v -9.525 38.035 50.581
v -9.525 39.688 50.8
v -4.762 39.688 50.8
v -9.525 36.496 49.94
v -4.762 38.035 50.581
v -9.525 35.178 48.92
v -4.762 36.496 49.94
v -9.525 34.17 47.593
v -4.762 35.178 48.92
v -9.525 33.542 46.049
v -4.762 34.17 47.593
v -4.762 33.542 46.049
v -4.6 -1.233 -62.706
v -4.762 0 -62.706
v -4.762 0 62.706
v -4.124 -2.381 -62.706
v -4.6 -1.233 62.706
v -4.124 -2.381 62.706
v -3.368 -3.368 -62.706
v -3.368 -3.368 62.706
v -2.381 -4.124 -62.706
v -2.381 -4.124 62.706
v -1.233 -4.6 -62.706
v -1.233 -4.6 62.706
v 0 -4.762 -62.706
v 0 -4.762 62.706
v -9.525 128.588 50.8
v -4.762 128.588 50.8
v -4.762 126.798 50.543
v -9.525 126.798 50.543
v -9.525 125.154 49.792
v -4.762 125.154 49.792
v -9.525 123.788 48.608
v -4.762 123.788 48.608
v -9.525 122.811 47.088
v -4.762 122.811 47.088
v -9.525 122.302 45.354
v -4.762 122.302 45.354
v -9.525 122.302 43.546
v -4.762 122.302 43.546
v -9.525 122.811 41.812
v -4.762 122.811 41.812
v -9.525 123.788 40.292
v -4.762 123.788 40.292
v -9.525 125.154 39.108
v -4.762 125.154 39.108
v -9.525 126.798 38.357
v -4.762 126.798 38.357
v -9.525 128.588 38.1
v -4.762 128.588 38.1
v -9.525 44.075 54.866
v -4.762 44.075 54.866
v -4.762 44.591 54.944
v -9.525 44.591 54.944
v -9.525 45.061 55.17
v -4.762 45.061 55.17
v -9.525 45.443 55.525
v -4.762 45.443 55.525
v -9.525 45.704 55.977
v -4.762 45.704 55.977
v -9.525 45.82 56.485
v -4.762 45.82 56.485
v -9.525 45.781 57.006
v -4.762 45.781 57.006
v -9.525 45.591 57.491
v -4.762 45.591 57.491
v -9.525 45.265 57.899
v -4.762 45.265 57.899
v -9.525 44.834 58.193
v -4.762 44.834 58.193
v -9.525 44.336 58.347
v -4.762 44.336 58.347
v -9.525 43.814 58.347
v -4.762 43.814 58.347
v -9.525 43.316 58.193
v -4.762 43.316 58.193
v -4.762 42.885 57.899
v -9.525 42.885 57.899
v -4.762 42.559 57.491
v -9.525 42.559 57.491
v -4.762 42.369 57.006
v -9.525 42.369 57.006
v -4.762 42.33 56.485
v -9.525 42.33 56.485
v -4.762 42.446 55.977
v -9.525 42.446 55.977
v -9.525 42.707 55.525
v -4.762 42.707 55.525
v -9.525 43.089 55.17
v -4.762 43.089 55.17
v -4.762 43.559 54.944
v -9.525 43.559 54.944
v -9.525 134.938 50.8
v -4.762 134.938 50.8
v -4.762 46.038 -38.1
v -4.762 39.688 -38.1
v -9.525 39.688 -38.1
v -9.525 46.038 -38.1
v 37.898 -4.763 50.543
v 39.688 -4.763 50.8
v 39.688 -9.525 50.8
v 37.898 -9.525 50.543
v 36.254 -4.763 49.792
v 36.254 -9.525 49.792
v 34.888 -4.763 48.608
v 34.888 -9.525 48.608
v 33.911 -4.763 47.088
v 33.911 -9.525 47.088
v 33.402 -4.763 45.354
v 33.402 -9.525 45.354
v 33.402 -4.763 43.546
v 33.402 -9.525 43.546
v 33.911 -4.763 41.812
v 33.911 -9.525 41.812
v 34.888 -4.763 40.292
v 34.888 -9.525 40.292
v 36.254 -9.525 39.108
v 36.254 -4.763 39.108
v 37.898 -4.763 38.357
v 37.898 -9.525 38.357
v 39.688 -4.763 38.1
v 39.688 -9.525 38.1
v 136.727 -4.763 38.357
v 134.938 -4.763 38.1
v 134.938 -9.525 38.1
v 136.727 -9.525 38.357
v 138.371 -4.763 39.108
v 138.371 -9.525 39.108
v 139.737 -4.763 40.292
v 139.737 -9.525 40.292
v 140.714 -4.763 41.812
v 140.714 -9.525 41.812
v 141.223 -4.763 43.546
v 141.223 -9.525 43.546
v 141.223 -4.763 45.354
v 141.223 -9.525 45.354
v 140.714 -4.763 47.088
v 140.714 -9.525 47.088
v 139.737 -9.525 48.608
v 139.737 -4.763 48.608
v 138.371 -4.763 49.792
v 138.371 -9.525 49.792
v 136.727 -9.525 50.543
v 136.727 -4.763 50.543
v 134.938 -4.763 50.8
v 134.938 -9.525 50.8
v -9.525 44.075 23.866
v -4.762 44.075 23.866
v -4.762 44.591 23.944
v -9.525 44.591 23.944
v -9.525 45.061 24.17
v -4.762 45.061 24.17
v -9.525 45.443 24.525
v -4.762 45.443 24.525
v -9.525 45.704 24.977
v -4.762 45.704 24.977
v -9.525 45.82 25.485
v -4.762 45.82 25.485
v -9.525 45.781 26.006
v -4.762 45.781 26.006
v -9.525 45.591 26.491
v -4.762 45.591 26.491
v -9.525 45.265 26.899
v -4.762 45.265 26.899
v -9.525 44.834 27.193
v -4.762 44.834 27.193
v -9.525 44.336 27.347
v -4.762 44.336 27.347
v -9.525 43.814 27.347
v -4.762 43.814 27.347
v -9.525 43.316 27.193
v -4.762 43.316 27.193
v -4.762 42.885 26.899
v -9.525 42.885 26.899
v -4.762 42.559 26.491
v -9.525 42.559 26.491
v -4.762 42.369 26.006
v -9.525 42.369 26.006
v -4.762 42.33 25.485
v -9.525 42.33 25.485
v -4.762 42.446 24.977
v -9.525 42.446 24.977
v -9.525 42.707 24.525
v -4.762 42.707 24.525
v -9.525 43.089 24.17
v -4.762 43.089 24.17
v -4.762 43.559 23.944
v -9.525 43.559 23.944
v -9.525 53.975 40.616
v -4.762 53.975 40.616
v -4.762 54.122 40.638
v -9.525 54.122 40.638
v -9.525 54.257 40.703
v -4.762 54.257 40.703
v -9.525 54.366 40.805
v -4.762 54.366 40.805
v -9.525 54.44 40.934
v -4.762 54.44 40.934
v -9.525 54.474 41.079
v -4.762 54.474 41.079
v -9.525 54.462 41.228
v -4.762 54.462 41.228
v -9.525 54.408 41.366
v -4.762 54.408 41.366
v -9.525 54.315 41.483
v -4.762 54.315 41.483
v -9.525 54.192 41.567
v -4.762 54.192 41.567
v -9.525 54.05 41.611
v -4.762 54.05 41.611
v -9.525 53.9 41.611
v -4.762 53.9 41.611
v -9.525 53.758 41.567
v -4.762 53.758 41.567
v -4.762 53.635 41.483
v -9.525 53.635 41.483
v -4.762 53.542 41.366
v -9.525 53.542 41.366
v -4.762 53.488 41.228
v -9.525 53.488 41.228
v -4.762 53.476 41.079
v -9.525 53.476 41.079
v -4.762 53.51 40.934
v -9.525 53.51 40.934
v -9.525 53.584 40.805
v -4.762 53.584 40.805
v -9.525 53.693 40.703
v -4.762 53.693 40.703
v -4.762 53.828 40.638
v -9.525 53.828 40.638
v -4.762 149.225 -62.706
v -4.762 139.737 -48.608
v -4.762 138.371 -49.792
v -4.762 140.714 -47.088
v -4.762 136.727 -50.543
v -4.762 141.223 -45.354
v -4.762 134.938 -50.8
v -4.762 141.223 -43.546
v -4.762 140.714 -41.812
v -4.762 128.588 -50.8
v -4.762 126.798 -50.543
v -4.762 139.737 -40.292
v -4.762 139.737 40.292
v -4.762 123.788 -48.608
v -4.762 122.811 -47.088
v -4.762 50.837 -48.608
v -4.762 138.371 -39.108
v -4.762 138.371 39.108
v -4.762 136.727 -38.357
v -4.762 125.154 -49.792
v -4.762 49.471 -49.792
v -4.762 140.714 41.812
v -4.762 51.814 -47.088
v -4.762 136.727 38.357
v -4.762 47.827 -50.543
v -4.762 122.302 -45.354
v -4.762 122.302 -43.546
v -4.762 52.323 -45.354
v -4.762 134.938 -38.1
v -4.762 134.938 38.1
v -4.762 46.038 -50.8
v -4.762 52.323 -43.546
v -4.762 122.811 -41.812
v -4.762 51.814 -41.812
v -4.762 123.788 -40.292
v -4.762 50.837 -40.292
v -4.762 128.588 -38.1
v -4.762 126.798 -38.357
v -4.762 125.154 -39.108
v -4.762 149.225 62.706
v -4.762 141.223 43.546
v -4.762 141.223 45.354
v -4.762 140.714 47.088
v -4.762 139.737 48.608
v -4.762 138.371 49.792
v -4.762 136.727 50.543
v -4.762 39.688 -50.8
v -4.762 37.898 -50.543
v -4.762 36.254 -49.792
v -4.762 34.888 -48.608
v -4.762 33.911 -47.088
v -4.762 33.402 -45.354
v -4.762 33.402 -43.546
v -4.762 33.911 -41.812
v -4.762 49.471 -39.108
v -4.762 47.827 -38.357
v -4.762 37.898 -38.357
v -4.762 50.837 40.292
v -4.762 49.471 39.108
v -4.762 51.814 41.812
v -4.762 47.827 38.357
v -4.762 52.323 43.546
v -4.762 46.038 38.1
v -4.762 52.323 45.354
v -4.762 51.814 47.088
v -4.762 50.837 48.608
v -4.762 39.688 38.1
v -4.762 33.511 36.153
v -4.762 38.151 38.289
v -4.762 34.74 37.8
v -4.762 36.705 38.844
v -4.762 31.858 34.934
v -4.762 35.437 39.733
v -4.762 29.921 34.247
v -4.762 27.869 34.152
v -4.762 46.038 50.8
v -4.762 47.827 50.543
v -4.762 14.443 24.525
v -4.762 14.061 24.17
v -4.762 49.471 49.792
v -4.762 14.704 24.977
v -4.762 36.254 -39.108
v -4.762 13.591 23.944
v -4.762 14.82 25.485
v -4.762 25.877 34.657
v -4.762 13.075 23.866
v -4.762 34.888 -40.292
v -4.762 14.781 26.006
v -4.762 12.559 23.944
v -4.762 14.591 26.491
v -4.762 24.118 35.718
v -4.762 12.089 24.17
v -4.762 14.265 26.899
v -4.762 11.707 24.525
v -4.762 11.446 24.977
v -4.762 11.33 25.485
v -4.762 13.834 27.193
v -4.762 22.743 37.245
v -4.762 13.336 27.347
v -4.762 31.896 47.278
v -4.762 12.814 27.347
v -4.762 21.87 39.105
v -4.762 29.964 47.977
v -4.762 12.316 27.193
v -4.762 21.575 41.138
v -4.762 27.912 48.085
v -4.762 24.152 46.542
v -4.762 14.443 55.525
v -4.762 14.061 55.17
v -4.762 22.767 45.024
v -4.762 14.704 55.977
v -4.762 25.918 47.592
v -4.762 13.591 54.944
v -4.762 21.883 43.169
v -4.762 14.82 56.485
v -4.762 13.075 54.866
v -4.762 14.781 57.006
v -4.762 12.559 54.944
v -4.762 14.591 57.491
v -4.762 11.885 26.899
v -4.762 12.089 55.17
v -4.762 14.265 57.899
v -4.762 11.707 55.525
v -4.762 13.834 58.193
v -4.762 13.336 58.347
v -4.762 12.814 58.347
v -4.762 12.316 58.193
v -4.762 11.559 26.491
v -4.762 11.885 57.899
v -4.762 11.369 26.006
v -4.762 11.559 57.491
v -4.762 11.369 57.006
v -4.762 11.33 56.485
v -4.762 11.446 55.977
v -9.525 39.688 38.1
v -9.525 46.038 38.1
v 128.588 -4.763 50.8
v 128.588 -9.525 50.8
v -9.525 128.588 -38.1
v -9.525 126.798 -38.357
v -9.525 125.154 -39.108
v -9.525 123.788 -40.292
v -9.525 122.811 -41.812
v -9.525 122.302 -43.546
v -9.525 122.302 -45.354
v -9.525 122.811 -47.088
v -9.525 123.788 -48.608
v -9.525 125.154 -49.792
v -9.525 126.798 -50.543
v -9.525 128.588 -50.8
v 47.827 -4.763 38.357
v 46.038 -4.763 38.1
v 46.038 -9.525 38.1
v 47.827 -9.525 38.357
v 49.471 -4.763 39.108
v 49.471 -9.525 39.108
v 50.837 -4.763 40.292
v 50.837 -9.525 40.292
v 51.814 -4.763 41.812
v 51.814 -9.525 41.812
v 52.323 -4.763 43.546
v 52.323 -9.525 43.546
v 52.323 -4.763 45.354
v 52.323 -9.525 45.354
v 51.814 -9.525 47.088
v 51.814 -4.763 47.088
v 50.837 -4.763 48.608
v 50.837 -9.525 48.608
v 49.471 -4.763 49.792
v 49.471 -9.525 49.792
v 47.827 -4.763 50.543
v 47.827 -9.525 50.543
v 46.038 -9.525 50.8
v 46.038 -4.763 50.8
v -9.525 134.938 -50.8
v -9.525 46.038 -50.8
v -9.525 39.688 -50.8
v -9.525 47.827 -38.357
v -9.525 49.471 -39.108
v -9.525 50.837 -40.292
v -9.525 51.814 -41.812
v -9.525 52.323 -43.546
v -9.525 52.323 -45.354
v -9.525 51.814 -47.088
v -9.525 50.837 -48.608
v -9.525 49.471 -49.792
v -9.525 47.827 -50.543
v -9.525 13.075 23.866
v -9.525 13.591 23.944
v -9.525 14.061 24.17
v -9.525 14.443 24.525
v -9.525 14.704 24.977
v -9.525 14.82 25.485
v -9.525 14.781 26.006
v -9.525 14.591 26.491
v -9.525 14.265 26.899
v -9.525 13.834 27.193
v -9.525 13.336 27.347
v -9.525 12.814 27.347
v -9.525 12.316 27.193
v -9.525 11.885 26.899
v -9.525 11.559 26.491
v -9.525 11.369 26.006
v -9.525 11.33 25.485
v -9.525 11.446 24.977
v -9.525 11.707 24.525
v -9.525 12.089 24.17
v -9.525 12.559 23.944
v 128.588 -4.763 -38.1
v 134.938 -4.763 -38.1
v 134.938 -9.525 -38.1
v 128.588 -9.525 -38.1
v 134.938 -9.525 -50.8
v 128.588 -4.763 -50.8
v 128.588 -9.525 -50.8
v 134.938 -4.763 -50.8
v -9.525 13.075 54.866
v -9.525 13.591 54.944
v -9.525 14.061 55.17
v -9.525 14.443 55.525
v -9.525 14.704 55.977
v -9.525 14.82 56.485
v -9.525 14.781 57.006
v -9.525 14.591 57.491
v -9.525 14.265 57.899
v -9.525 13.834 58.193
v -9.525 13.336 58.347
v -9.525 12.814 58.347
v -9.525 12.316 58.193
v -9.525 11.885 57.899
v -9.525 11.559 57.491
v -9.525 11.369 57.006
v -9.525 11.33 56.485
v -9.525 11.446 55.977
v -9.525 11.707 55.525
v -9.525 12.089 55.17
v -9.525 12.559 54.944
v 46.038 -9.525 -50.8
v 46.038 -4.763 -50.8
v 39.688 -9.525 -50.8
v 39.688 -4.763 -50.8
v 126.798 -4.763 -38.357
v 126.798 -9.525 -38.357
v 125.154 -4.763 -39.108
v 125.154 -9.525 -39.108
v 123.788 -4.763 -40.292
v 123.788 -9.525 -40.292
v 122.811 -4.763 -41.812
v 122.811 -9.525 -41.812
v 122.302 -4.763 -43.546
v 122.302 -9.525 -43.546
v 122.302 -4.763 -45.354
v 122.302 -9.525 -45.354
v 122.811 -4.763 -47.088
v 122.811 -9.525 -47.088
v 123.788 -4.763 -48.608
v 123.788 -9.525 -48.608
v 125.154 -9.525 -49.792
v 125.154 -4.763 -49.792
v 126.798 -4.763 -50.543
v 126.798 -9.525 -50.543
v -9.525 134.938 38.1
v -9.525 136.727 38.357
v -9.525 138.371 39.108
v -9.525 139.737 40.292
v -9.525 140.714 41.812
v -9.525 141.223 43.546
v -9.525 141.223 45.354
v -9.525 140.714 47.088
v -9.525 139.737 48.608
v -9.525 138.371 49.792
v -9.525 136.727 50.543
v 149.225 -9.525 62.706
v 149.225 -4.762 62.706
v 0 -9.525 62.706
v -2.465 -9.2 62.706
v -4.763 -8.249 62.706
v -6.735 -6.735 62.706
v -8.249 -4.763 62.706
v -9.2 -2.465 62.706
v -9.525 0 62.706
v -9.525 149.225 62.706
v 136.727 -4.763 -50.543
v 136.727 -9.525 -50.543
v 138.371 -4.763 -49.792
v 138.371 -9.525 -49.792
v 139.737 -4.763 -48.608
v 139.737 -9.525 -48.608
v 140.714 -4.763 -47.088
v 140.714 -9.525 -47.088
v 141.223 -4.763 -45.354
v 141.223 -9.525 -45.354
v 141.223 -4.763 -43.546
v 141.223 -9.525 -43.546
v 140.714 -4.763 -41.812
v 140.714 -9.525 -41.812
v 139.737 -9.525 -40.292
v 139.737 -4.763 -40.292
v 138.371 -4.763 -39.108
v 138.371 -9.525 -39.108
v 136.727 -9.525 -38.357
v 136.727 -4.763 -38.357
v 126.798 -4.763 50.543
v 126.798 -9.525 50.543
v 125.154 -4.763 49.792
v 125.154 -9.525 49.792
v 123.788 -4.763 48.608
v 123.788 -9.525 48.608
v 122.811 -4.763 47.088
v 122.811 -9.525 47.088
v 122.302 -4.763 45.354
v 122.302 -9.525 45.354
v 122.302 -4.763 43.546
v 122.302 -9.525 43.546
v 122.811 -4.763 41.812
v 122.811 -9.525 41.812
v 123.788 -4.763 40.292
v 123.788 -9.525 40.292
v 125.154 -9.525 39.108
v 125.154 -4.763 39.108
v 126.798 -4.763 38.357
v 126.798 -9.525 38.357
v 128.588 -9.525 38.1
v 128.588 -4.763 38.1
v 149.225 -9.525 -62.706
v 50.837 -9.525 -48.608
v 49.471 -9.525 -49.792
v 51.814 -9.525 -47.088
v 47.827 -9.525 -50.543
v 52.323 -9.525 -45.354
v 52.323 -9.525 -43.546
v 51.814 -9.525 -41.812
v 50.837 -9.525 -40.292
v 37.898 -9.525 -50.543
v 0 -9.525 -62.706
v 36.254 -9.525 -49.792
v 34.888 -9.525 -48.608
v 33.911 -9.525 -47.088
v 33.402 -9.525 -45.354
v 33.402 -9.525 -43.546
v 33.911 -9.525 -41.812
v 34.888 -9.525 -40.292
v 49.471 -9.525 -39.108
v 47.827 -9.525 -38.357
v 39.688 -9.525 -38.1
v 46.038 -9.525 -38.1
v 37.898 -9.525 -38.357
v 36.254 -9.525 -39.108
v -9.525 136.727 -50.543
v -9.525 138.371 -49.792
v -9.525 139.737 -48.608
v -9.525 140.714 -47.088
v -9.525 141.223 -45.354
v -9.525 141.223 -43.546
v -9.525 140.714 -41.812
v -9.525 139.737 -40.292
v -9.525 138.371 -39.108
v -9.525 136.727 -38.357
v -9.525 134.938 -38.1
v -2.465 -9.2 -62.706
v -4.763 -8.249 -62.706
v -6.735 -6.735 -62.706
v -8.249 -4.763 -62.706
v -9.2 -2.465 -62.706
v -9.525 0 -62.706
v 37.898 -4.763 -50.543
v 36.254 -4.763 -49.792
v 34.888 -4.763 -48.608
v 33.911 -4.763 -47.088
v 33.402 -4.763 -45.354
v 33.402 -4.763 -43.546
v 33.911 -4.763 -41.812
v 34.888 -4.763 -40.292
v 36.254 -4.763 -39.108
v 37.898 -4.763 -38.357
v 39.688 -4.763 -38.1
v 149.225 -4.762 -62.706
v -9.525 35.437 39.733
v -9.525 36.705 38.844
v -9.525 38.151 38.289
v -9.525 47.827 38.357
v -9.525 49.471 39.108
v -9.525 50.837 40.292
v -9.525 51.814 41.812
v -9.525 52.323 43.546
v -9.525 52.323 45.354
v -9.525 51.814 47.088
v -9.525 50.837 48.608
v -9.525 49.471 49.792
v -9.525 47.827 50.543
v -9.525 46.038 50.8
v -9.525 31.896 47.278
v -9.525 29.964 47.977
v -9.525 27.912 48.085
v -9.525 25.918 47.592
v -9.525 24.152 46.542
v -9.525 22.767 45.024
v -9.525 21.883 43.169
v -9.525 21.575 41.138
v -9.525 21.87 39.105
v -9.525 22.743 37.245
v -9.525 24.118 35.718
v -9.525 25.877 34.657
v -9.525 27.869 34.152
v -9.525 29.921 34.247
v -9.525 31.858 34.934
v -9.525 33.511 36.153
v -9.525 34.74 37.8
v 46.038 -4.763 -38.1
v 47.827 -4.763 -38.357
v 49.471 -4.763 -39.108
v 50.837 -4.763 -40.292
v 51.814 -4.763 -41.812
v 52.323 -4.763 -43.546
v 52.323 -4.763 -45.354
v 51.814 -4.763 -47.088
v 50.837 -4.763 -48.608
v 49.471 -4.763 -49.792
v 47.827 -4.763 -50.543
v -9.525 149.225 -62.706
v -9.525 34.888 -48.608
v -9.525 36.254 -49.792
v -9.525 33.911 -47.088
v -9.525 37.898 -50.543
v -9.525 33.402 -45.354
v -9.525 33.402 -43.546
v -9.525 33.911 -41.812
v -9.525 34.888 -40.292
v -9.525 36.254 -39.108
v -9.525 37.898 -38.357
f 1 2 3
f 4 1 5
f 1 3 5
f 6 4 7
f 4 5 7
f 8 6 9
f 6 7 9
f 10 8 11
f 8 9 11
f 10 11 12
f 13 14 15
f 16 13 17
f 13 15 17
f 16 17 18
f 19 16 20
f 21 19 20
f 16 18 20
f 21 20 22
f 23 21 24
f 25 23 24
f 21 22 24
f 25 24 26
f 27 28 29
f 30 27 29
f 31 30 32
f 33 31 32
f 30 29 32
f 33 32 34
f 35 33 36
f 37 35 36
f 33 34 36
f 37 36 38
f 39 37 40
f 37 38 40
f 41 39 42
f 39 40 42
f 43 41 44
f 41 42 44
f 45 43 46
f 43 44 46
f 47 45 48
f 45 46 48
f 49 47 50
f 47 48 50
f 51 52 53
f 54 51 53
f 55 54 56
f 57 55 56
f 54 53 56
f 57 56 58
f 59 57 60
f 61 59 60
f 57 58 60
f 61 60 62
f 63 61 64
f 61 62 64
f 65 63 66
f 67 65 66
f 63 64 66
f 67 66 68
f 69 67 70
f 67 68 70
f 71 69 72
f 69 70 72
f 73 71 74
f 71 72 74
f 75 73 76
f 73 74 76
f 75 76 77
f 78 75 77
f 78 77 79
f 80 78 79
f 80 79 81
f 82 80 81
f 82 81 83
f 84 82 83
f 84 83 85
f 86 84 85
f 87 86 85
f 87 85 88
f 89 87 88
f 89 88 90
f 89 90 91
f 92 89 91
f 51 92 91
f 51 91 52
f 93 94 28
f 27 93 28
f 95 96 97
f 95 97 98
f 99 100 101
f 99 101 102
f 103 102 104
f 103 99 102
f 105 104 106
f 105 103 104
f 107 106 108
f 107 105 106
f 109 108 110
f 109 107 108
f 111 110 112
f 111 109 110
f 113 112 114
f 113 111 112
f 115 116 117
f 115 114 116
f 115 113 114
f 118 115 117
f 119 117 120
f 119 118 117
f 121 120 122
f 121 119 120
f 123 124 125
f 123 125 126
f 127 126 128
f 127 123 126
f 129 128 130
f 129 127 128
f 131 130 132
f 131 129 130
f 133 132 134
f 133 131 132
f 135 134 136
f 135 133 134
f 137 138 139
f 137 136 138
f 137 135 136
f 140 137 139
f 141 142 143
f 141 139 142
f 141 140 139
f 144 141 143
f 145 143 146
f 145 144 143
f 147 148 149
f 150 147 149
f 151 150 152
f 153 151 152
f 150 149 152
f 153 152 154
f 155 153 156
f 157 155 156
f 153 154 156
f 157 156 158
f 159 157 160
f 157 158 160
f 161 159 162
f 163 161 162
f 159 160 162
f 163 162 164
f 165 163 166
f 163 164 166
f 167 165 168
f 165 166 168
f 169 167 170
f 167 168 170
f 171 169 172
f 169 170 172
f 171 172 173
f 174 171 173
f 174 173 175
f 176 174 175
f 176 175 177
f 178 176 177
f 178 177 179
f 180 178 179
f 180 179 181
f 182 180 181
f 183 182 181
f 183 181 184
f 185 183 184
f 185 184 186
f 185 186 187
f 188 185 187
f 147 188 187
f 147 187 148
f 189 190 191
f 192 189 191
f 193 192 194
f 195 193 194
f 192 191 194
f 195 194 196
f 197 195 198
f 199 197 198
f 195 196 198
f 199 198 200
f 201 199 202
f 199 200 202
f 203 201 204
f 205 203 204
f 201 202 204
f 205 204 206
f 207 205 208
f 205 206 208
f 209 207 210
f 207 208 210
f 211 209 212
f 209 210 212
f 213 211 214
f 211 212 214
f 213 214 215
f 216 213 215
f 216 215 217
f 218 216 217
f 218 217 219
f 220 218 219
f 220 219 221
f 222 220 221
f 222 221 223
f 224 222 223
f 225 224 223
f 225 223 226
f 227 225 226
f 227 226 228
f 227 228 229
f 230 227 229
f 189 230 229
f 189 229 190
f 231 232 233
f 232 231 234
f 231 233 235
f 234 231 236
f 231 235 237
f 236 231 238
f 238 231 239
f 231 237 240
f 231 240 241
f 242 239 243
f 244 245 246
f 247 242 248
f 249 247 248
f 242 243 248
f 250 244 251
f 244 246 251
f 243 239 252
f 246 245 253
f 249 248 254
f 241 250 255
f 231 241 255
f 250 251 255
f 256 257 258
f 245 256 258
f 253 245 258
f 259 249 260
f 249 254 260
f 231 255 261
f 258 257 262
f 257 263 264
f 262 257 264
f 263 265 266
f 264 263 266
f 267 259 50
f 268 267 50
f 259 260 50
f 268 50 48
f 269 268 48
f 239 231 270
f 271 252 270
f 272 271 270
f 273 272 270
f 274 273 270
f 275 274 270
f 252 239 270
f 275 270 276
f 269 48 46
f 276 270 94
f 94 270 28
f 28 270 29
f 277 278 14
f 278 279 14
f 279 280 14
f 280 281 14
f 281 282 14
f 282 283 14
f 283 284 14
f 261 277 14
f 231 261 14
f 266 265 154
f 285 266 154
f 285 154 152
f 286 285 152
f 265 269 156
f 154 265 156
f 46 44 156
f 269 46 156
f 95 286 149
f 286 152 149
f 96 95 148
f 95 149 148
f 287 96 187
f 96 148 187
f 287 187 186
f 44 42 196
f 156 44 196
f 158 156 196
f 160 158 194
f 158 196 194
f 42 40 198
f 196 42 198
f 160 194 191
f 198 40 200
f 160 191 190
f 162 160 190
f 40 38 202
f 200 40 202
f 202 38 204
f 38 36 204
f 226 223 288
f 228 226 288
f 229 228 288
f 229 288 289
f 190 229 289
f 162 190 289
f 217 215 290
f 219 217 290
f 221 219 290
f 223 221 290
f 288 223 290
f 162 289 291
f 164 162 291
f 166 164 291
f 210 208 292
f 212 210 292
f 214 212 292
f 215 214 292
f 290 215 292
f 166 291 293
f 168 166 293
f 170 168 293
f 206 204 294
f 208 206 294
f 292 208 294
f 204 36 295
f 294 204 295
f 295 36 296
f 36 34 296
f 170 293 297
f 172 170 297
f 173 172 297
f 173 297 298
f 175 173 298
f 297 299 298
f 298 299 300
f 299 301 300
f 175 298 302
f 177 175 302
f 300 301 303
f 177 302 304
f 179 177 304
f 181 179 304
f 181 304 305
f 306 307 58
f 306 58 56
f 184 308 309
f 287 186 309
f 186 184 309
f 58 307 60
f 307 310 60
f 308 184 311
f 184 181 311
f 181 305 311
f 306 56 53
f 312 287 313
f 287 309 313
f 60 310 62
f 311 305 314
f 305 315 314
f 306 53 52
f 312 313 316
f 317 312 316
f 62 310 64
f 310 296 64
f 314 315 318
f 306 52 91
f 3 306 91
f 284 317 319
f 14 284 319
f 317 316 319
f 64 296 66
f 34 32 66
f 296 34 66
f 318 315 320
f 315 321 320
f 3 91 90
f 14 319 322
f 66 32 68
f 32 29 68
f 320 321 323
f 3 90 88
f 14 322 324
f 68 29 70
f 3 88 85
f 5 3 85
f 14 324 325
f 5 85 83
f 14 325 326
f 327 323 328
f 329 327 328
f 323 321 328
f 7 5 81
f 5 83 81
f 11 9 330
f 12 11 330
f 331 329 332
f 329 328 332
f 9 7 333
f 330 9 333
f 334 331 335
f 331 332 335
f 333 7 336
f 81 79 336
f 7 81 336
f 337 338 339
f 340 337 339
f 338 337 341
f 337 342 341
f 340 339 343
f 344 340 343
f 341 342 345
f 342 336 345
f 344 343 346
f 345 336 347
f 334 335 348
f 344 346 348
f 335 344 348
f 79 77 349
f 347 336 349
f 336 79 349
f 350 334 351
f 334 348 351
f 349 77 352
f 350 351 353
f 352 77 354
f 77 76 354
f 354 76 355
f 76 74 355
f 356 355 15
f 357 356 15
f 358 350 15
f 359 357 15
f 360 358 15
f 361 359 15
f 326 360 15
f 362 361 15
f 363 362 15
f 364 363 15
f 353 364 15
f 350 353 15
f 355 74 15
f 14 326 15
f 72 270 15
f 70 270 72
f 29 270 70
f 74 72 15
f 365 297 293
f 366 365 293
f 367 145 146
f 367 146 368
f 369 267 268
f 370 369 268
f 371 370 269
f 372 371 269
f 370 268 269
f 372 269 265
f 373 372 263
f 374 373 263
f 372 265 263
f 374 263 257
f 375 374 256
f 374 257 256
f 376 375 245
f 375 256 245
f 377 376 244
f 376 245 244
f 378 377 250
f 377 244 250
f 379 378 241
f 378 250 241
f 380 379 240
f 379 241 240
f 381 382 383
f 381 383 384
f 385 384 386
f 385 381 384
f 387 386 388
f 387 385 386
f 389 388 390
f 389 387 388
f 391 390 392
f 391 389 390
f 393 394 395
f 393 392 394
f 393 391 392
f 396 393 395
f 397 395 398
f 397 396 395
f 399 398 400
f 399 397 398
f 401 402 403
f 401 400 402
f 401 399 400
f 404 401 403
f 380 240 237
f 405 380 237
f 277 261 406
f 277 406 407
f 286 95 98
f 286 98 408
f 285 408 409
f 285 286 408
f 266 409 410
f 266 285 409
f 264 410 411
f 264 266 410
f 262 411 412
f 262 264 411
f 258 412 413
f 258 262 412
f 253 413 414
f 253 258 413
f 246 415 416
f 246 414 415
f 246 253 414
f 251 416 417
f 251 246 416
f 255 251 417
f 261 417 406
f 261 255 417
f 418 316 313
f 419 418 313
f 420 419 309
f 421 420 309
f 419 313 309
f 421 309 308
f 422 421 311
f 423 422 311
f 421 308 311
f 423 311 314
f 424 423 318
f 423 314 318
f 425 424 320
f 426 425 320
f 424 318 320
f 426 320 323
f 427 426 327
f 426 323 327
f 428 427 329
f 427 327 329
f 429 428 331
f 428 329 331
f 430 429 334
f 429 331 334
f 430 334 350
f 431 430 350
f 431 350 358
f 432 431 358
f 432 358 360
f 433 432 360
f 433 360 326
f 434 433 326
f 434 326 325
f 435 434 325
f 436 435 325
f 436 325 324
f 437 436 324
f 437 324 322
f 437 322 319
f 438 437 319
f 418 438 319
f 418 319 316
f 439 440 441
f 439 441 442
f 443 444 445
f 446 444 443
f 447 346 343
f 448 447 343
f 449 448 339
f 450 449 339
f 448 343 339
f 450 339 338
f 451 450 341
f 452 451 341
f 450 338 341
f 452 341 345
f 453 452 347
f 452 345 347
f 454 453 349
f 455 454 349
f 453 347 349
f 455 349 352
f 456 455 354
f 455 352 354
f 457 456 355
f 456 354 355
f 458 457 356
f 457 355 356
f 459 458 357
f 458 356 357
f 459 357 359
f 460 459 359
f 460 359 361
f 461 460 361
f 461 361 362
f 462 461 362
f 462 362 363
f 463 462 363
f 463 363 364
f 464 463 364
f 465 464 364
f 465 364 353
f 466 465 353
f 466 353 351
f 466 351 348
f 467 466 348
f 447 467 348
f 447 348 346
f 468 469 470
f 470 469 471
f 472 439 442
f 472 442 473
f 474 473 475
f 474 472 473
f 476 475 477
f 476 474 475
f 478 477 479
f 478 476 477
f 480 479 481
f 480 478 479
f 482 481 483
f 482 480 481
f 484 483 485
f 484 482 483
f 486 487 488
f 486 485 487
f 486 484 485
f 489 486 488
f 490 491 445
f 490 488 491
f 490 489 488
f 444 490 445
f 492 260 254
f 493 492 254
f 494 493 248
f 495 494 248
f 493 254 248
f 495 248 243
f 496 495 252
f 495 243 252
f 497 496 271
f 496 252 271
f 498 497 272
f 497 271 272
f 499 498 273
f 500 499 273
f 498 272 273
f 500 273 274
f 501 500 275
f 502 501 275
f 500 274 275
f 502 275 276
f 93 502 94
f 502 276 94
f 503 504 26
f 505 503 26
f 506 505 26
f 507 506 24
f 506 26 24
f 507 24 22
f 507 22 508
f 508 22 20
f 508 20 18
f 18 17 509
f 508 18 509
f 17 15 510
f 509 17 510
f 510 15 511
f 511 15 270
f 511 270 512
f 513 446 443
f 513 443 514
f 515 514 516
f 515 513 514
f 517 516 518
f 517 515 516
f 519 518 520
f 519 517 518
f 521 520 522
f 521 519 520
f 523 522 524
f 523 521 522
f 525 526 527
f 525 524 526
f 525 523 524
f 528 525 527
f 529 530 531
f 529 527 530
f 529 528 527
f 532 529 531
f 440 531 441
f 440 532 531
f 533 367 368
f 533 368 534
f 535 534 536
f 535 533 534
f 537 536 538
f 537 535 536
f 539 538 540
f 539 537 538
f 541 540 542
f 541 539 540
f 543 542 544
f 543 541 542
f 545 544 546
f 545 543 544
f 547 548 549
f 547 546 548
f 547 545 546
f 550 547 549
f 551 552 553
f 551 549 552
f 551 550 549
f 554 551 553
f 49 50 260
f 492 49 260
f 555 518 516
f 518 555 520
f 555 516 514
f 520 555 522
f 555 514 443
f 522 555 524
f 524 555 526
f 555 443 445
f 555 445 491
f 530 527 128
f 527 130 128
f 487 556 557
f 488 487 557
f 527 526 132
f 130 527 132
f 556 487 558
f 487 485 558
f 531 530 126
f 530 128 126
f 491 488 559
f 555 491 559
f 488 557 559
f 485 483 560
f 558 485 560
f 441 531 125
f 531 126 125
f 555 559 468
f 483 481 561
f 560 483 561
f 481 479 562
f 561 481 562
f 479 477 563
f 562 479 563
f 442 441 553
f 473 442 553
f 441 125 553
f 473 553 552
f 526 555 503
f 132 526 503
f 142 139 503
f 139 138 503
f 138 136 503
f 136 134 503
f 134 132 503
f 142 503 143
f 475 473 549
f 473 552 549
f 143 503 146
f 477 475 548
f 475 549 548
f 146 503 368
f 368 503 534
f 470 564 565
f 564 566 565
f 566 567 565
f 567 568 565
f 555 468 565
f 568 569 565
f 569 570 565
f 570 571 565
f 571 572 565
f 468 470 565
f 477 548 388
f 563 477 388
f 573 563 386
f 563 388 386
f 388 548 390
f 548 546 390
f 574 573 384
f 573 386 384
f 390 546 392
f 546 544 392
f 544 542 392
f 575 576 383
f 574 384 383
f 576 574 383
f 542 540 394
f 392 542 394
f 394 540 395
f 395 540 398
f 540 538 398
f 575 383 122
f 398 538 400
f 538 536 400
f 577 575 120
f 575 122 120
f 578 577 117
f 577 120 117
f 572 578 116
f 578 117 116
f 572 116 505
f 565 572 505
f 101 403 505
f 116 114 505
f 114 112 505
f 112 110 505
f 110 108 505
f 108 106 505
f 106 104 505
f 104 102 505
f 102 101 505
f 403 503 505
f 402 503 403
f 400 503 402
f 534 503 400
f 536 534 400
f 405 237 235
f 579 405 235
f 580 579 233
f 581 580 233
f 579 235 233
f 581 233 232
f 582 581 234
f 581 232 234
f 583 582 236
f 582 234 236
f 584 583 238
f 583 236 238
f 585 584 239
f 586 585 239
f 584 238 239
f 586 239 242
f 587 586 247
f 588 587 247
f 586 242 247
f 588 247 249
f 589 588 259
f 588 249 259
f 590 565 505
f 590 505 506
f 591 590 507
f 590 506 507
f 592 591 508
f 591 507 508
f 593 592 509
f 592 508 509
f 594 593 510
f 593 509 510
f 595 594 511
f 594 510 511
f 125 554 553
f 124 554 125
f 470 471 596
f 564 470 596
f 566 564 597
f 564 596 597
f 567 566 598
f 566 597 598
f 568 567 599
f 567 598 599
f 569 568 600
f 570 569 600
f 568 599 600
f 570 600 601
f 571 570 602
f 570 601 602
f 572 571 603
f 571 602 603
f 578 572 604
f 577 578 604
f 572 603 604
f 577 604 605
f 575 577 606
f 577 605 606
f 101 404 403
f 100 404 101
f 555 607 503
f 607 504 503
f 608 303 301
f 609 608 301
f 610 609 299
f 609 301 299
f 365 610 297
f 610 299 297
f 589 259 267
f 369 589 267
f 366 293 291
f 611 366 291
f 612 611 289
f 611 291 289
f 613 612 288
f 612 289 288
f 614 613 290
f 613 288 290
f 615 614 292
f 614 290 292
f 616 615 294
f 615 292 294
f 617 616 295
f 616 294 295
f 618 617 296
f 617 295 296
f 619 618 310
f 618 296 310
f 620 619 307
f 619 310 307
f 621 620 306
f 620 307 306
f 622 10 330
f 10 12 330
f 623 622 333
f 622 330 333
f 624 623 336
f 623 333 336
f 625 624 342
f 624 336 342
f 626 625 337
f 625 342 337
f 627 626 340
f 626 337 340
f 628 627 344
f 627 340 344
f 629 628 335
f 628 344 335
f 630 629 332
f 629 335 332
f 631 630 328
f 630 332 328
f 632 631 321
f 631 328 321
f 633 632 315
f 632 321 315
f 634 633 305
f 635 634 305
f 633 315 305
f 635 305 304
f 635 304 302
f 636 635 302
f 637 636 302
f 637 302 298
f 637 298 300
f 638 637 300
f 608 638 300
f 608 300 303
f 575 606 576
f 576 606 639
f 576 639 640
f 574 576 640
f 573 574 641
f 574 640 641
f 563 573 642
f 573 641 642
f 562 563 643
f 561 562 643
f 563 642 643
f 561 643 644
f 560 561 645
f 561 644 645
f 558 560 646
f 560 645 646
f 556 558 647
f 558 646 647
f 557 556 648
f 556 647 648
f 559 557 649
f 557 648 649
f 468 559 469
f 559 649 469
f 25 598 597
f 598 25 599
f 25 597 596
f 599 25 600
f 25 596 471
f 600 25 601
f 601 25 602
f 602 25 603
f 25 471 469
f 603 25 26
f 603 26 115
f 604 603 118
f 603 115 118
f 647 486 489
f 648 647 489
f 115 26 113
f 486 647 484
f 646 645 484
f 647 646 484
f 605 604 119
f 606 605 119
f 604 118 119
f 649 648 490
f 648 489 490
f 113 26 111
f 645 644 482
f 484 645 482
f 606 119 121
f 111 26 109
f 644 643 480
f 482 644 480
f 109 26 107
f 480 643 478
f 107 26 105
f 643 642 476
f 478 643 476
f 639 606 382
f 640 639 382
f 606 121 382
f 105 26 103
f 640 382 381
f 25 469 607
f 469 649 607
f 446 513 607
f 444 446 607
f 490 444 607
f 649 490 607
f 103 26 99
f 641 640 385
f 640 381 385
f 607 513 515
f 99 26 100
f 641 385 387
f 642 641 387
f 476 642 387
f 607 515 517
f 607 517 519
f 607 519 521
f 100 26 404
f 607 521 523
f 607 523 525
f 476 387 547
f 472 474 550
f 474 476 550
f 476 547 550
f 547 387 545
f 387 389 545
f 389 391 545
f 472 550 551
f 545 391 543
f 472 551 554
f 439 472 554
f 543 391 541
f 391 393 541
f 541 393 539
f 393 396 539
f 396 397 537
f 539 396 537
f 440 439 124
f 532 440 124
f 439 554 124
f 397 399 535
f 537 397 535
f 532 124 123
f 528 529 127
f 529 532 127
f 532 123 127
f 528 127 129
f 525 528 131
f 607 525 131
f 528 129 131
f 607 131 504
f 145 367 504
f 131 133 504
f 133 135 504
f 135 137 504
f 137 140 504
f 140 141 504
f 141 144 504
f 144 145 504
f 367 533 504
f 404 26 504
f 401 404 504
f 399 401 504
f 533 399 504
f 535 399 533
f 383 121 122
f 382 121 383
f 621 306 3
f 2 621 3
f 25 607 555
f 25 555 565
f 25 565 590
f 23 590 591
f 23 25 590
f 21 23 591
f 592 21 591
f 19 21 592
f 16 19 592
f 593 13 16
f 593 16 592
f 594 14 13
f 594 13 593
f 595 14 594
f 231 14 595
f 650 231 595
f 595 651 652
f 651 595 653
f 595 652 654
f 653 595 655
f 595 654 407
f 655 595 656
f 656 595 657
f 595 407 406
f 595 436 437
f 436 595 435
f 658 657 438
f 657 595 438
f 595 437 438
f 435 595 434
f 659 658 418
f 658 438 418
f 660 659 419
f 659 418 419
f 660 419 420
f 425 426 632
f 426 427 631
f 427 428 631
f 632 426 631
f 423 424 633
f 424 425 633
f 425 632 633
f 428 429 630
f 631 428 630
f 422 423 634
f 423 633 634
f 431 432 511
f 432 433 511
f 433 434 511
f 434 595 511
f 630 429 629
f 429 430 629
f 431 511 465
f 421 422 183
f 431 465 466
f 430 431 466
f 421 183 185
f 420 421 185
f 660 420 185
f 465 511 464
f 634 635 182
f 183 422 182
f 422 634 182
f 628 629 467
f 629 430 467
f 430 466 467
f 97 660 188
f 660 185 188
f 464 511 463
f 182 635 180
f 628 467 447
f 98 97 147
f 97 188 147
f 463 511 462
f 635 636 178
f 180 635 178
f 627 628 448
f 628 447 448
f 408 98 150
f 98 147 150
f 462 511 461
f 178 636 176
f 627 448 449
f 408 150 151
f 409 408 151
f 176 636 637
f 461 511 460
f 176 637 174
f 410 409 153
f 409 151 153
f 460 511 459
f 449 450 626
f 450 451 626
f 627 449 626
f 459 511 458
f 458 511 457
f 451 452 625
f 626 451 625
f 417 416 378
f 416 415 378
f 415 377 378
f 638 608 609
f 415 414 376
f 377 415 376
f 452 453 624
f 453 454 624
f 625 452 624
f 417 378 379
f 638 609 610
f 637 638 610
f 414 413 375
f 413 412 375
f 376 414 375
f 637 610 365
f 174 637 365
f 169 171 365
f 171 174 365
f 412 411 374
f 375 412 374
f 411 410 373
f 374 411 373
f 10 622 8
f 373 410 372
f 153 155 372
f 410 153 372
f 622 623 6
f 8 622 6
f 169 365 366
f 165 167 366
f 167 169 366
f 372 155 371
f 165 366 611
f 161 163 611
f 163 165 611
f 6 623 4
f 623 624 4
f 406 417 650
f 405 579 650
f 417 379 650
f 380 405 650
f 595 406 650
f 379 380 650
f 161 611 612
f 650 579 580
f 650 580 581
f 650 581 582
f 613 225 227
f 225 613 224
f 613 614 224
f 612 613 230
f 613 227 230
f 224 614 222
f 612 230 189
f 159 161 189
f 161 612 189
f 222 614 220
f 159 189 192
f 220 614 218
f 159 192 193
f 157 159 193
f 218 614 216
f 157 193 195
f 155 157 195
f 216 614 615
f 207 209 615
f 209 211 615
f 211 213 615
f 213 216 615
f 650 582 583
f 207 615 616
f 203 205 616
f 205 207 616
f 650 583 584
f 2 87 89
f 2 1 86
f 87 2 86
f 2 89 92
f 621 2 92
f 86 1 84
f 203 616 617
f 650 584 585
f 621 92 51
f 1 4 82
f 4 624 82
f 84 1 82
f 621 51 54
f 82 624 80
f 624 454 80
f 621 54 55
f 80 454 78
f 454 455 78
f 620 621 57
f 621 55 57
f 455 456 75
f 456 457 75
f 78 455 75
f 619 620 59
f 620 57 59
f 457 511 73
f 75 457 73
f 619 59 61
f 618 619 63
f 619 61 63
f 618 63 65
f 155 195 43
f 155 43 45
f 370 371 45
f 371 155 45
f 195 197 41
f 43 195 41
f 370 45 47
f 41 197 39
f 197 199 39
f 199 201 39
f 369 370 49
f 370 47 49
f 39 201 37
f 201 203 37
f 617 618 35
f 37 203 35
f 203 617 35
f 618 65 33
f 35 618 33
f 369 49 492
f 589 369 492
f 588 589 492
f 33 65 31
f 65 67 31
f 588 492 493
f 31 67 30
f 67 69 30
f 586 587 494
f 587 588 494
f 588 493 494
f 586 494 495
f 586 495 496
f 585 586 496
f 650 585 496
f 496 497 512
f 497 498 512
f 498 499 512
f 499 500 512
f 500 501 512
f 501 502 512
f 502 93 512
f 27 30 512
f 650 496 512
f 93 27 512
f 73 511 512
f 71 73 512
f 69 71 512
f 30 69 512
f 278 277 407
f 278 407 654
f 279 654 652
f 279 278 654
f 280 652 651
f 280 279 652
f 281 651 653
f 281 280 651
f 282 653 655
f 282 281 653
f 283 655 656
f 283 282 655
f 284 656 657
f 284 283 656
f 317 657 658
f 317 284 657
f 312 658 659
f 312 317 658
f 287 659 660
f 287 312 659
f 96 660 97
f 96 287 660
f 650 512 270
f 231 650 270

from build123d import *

# Parameters (mm, degrees)
BOSS_EXTRUDE1_DEPTH = 62.70625
CUT_EXTRUDE1_DEPTH  = 224.410663511
SKETCH3_R           = 7
SKETCH3_R_2         = 1.75
SKETCH3_R_3         = 0.5
CUT_EXTRUDE2_DEPTH  = 224.410663511


with BuildPart() as part:
    # Sketch1 → Boss-Extrude1 (new, symmetric)
    with BuildSketch(Plane.XY):
        with BuildLine():
            Line((-9.525, 149.225), (-4.7625, 149.225))
            Line((-4.7625, 149.225), (-4.7625, 0))
            ThreePointArc((-4.7625, 0), (-3.367596045, -3.367596045), (0, -4.7625))
            Line((0, -4.7625), (149.225, -4.7625))
            Line((149.225, -4.7625), (149.225, -9.525))
            Line((149.225, -9.525), (0, -9.525))
            ThreePointArc((0, -9.525), (-6.735192091, -6.735192091), (-9.525, 0))
            Line((-9.525, 0), (-9.525, 149.225))
        make_face()
    extrude(amount=BOSS_EXTRUDE1_DEPTH, both=True)

    # Sketch2 → Cut-Extrude1 (cut, through all)
    with BuildSketch(Plane(origin=(-4.7625, 0, 0), x_dir=(0, 0, -1), z_dir=(1, 0, 0))):
        with BuildLine():
            Line((-50.8, 134.9375), (-50.8, 128.5875))
            ThreePointArc((-50.8, 128.5875), (-44.45, 122.2375), (-38.1, 128.5875))
            Line((-38.1, 128.5875), (-38.1, 134.9375))
            ThreePointArc((-38.1, 134.9375), (-44.45, 141.2875), (-50.8, 134.9375))
        make_face()
        with BuildLine():
            Line((-50.8, 46.0375), (-50.8, 39.6875))
            ThreePointArc((-50.8, 39.6875), (-44.45, 33.3375), (-38.1, 39.6875))
            Line((-38.1, 39.6875), (-38.1, 46.0375))
            ThreePointArc((-38.1, 46.0375), (-44.45, 52.3875), (-50.8, 46.0375))
        make_face()
        with BuildLine():
            Line((38.1, 39.6875), (38.1, 46.0375))
            ThreePointArc((38.1, 46.0375), (44.45, 52.3875), (50.8, 46.0375))
            Line((50.8, 46.0375), (50.8, 39.6875))
            ThreePointArc((50.8, 39.6875), (44.45, 33.3375), (38.1, 39.6875))
        make_face()
        with BuildLine():
            Line((38.1, 134.9375), (38.1, 128.5875))
            ThreePointArc((38.1, 128.5875), (44.45, 122.2375), (50.8, 128.5875))
            Line((50.8, 128.5875), (50.8, 134.9375))
            ThreePointArc((50.8, 134.9375), (44.45, 141.2875), (38.1, 134.9375))
        make_face()
    cut_extrude1 = extrude(amount=-CUT_EXTRUDE1_DEPTH, mode=Mode.SUBTRACT)

    # Mirror1: Cut-Extrude1 across plane
    add(cut_extrude1.mirror(Plane(origin=(0, 0, 0), x_dir=(0, 0, 1), z_dir=(0.7071067811865475, -0.7071067811865476, 0))), mode=Mode.SUBTRACT)

    # Sketch3 → Cut-Extrude2 (cut, through all)
    with BuildSketch(Plane(origin=(-4.7625, 0, 0), x_dir=(0, 0, -1), z_dir=(1, 0, 0))):
        with Locations((-41.11625, 28.575)):
            Circle(SKETCH3_R)
        with Locations((-25.61625, 44.075)):
            Circle(SKETCH3_R_2)
        with Locations((-56.61625, 44.075)):
            Circle(SKETCH3_R_2)
        with Locations((-25.61625, 13.075)):
            Circle(SKETCH3_R_2)
        with Locations((-56.61625, 13.075)):
            Circle(SKETCH3_R_2)
        with Locations((-41.11625, 53.975)):
            Circle(SKETCH3_R_3)
    extrude(amount=-CUT_EXTRUDE2_DEPTH, mode=Mode.SUBTRACT)


solid = part.part
